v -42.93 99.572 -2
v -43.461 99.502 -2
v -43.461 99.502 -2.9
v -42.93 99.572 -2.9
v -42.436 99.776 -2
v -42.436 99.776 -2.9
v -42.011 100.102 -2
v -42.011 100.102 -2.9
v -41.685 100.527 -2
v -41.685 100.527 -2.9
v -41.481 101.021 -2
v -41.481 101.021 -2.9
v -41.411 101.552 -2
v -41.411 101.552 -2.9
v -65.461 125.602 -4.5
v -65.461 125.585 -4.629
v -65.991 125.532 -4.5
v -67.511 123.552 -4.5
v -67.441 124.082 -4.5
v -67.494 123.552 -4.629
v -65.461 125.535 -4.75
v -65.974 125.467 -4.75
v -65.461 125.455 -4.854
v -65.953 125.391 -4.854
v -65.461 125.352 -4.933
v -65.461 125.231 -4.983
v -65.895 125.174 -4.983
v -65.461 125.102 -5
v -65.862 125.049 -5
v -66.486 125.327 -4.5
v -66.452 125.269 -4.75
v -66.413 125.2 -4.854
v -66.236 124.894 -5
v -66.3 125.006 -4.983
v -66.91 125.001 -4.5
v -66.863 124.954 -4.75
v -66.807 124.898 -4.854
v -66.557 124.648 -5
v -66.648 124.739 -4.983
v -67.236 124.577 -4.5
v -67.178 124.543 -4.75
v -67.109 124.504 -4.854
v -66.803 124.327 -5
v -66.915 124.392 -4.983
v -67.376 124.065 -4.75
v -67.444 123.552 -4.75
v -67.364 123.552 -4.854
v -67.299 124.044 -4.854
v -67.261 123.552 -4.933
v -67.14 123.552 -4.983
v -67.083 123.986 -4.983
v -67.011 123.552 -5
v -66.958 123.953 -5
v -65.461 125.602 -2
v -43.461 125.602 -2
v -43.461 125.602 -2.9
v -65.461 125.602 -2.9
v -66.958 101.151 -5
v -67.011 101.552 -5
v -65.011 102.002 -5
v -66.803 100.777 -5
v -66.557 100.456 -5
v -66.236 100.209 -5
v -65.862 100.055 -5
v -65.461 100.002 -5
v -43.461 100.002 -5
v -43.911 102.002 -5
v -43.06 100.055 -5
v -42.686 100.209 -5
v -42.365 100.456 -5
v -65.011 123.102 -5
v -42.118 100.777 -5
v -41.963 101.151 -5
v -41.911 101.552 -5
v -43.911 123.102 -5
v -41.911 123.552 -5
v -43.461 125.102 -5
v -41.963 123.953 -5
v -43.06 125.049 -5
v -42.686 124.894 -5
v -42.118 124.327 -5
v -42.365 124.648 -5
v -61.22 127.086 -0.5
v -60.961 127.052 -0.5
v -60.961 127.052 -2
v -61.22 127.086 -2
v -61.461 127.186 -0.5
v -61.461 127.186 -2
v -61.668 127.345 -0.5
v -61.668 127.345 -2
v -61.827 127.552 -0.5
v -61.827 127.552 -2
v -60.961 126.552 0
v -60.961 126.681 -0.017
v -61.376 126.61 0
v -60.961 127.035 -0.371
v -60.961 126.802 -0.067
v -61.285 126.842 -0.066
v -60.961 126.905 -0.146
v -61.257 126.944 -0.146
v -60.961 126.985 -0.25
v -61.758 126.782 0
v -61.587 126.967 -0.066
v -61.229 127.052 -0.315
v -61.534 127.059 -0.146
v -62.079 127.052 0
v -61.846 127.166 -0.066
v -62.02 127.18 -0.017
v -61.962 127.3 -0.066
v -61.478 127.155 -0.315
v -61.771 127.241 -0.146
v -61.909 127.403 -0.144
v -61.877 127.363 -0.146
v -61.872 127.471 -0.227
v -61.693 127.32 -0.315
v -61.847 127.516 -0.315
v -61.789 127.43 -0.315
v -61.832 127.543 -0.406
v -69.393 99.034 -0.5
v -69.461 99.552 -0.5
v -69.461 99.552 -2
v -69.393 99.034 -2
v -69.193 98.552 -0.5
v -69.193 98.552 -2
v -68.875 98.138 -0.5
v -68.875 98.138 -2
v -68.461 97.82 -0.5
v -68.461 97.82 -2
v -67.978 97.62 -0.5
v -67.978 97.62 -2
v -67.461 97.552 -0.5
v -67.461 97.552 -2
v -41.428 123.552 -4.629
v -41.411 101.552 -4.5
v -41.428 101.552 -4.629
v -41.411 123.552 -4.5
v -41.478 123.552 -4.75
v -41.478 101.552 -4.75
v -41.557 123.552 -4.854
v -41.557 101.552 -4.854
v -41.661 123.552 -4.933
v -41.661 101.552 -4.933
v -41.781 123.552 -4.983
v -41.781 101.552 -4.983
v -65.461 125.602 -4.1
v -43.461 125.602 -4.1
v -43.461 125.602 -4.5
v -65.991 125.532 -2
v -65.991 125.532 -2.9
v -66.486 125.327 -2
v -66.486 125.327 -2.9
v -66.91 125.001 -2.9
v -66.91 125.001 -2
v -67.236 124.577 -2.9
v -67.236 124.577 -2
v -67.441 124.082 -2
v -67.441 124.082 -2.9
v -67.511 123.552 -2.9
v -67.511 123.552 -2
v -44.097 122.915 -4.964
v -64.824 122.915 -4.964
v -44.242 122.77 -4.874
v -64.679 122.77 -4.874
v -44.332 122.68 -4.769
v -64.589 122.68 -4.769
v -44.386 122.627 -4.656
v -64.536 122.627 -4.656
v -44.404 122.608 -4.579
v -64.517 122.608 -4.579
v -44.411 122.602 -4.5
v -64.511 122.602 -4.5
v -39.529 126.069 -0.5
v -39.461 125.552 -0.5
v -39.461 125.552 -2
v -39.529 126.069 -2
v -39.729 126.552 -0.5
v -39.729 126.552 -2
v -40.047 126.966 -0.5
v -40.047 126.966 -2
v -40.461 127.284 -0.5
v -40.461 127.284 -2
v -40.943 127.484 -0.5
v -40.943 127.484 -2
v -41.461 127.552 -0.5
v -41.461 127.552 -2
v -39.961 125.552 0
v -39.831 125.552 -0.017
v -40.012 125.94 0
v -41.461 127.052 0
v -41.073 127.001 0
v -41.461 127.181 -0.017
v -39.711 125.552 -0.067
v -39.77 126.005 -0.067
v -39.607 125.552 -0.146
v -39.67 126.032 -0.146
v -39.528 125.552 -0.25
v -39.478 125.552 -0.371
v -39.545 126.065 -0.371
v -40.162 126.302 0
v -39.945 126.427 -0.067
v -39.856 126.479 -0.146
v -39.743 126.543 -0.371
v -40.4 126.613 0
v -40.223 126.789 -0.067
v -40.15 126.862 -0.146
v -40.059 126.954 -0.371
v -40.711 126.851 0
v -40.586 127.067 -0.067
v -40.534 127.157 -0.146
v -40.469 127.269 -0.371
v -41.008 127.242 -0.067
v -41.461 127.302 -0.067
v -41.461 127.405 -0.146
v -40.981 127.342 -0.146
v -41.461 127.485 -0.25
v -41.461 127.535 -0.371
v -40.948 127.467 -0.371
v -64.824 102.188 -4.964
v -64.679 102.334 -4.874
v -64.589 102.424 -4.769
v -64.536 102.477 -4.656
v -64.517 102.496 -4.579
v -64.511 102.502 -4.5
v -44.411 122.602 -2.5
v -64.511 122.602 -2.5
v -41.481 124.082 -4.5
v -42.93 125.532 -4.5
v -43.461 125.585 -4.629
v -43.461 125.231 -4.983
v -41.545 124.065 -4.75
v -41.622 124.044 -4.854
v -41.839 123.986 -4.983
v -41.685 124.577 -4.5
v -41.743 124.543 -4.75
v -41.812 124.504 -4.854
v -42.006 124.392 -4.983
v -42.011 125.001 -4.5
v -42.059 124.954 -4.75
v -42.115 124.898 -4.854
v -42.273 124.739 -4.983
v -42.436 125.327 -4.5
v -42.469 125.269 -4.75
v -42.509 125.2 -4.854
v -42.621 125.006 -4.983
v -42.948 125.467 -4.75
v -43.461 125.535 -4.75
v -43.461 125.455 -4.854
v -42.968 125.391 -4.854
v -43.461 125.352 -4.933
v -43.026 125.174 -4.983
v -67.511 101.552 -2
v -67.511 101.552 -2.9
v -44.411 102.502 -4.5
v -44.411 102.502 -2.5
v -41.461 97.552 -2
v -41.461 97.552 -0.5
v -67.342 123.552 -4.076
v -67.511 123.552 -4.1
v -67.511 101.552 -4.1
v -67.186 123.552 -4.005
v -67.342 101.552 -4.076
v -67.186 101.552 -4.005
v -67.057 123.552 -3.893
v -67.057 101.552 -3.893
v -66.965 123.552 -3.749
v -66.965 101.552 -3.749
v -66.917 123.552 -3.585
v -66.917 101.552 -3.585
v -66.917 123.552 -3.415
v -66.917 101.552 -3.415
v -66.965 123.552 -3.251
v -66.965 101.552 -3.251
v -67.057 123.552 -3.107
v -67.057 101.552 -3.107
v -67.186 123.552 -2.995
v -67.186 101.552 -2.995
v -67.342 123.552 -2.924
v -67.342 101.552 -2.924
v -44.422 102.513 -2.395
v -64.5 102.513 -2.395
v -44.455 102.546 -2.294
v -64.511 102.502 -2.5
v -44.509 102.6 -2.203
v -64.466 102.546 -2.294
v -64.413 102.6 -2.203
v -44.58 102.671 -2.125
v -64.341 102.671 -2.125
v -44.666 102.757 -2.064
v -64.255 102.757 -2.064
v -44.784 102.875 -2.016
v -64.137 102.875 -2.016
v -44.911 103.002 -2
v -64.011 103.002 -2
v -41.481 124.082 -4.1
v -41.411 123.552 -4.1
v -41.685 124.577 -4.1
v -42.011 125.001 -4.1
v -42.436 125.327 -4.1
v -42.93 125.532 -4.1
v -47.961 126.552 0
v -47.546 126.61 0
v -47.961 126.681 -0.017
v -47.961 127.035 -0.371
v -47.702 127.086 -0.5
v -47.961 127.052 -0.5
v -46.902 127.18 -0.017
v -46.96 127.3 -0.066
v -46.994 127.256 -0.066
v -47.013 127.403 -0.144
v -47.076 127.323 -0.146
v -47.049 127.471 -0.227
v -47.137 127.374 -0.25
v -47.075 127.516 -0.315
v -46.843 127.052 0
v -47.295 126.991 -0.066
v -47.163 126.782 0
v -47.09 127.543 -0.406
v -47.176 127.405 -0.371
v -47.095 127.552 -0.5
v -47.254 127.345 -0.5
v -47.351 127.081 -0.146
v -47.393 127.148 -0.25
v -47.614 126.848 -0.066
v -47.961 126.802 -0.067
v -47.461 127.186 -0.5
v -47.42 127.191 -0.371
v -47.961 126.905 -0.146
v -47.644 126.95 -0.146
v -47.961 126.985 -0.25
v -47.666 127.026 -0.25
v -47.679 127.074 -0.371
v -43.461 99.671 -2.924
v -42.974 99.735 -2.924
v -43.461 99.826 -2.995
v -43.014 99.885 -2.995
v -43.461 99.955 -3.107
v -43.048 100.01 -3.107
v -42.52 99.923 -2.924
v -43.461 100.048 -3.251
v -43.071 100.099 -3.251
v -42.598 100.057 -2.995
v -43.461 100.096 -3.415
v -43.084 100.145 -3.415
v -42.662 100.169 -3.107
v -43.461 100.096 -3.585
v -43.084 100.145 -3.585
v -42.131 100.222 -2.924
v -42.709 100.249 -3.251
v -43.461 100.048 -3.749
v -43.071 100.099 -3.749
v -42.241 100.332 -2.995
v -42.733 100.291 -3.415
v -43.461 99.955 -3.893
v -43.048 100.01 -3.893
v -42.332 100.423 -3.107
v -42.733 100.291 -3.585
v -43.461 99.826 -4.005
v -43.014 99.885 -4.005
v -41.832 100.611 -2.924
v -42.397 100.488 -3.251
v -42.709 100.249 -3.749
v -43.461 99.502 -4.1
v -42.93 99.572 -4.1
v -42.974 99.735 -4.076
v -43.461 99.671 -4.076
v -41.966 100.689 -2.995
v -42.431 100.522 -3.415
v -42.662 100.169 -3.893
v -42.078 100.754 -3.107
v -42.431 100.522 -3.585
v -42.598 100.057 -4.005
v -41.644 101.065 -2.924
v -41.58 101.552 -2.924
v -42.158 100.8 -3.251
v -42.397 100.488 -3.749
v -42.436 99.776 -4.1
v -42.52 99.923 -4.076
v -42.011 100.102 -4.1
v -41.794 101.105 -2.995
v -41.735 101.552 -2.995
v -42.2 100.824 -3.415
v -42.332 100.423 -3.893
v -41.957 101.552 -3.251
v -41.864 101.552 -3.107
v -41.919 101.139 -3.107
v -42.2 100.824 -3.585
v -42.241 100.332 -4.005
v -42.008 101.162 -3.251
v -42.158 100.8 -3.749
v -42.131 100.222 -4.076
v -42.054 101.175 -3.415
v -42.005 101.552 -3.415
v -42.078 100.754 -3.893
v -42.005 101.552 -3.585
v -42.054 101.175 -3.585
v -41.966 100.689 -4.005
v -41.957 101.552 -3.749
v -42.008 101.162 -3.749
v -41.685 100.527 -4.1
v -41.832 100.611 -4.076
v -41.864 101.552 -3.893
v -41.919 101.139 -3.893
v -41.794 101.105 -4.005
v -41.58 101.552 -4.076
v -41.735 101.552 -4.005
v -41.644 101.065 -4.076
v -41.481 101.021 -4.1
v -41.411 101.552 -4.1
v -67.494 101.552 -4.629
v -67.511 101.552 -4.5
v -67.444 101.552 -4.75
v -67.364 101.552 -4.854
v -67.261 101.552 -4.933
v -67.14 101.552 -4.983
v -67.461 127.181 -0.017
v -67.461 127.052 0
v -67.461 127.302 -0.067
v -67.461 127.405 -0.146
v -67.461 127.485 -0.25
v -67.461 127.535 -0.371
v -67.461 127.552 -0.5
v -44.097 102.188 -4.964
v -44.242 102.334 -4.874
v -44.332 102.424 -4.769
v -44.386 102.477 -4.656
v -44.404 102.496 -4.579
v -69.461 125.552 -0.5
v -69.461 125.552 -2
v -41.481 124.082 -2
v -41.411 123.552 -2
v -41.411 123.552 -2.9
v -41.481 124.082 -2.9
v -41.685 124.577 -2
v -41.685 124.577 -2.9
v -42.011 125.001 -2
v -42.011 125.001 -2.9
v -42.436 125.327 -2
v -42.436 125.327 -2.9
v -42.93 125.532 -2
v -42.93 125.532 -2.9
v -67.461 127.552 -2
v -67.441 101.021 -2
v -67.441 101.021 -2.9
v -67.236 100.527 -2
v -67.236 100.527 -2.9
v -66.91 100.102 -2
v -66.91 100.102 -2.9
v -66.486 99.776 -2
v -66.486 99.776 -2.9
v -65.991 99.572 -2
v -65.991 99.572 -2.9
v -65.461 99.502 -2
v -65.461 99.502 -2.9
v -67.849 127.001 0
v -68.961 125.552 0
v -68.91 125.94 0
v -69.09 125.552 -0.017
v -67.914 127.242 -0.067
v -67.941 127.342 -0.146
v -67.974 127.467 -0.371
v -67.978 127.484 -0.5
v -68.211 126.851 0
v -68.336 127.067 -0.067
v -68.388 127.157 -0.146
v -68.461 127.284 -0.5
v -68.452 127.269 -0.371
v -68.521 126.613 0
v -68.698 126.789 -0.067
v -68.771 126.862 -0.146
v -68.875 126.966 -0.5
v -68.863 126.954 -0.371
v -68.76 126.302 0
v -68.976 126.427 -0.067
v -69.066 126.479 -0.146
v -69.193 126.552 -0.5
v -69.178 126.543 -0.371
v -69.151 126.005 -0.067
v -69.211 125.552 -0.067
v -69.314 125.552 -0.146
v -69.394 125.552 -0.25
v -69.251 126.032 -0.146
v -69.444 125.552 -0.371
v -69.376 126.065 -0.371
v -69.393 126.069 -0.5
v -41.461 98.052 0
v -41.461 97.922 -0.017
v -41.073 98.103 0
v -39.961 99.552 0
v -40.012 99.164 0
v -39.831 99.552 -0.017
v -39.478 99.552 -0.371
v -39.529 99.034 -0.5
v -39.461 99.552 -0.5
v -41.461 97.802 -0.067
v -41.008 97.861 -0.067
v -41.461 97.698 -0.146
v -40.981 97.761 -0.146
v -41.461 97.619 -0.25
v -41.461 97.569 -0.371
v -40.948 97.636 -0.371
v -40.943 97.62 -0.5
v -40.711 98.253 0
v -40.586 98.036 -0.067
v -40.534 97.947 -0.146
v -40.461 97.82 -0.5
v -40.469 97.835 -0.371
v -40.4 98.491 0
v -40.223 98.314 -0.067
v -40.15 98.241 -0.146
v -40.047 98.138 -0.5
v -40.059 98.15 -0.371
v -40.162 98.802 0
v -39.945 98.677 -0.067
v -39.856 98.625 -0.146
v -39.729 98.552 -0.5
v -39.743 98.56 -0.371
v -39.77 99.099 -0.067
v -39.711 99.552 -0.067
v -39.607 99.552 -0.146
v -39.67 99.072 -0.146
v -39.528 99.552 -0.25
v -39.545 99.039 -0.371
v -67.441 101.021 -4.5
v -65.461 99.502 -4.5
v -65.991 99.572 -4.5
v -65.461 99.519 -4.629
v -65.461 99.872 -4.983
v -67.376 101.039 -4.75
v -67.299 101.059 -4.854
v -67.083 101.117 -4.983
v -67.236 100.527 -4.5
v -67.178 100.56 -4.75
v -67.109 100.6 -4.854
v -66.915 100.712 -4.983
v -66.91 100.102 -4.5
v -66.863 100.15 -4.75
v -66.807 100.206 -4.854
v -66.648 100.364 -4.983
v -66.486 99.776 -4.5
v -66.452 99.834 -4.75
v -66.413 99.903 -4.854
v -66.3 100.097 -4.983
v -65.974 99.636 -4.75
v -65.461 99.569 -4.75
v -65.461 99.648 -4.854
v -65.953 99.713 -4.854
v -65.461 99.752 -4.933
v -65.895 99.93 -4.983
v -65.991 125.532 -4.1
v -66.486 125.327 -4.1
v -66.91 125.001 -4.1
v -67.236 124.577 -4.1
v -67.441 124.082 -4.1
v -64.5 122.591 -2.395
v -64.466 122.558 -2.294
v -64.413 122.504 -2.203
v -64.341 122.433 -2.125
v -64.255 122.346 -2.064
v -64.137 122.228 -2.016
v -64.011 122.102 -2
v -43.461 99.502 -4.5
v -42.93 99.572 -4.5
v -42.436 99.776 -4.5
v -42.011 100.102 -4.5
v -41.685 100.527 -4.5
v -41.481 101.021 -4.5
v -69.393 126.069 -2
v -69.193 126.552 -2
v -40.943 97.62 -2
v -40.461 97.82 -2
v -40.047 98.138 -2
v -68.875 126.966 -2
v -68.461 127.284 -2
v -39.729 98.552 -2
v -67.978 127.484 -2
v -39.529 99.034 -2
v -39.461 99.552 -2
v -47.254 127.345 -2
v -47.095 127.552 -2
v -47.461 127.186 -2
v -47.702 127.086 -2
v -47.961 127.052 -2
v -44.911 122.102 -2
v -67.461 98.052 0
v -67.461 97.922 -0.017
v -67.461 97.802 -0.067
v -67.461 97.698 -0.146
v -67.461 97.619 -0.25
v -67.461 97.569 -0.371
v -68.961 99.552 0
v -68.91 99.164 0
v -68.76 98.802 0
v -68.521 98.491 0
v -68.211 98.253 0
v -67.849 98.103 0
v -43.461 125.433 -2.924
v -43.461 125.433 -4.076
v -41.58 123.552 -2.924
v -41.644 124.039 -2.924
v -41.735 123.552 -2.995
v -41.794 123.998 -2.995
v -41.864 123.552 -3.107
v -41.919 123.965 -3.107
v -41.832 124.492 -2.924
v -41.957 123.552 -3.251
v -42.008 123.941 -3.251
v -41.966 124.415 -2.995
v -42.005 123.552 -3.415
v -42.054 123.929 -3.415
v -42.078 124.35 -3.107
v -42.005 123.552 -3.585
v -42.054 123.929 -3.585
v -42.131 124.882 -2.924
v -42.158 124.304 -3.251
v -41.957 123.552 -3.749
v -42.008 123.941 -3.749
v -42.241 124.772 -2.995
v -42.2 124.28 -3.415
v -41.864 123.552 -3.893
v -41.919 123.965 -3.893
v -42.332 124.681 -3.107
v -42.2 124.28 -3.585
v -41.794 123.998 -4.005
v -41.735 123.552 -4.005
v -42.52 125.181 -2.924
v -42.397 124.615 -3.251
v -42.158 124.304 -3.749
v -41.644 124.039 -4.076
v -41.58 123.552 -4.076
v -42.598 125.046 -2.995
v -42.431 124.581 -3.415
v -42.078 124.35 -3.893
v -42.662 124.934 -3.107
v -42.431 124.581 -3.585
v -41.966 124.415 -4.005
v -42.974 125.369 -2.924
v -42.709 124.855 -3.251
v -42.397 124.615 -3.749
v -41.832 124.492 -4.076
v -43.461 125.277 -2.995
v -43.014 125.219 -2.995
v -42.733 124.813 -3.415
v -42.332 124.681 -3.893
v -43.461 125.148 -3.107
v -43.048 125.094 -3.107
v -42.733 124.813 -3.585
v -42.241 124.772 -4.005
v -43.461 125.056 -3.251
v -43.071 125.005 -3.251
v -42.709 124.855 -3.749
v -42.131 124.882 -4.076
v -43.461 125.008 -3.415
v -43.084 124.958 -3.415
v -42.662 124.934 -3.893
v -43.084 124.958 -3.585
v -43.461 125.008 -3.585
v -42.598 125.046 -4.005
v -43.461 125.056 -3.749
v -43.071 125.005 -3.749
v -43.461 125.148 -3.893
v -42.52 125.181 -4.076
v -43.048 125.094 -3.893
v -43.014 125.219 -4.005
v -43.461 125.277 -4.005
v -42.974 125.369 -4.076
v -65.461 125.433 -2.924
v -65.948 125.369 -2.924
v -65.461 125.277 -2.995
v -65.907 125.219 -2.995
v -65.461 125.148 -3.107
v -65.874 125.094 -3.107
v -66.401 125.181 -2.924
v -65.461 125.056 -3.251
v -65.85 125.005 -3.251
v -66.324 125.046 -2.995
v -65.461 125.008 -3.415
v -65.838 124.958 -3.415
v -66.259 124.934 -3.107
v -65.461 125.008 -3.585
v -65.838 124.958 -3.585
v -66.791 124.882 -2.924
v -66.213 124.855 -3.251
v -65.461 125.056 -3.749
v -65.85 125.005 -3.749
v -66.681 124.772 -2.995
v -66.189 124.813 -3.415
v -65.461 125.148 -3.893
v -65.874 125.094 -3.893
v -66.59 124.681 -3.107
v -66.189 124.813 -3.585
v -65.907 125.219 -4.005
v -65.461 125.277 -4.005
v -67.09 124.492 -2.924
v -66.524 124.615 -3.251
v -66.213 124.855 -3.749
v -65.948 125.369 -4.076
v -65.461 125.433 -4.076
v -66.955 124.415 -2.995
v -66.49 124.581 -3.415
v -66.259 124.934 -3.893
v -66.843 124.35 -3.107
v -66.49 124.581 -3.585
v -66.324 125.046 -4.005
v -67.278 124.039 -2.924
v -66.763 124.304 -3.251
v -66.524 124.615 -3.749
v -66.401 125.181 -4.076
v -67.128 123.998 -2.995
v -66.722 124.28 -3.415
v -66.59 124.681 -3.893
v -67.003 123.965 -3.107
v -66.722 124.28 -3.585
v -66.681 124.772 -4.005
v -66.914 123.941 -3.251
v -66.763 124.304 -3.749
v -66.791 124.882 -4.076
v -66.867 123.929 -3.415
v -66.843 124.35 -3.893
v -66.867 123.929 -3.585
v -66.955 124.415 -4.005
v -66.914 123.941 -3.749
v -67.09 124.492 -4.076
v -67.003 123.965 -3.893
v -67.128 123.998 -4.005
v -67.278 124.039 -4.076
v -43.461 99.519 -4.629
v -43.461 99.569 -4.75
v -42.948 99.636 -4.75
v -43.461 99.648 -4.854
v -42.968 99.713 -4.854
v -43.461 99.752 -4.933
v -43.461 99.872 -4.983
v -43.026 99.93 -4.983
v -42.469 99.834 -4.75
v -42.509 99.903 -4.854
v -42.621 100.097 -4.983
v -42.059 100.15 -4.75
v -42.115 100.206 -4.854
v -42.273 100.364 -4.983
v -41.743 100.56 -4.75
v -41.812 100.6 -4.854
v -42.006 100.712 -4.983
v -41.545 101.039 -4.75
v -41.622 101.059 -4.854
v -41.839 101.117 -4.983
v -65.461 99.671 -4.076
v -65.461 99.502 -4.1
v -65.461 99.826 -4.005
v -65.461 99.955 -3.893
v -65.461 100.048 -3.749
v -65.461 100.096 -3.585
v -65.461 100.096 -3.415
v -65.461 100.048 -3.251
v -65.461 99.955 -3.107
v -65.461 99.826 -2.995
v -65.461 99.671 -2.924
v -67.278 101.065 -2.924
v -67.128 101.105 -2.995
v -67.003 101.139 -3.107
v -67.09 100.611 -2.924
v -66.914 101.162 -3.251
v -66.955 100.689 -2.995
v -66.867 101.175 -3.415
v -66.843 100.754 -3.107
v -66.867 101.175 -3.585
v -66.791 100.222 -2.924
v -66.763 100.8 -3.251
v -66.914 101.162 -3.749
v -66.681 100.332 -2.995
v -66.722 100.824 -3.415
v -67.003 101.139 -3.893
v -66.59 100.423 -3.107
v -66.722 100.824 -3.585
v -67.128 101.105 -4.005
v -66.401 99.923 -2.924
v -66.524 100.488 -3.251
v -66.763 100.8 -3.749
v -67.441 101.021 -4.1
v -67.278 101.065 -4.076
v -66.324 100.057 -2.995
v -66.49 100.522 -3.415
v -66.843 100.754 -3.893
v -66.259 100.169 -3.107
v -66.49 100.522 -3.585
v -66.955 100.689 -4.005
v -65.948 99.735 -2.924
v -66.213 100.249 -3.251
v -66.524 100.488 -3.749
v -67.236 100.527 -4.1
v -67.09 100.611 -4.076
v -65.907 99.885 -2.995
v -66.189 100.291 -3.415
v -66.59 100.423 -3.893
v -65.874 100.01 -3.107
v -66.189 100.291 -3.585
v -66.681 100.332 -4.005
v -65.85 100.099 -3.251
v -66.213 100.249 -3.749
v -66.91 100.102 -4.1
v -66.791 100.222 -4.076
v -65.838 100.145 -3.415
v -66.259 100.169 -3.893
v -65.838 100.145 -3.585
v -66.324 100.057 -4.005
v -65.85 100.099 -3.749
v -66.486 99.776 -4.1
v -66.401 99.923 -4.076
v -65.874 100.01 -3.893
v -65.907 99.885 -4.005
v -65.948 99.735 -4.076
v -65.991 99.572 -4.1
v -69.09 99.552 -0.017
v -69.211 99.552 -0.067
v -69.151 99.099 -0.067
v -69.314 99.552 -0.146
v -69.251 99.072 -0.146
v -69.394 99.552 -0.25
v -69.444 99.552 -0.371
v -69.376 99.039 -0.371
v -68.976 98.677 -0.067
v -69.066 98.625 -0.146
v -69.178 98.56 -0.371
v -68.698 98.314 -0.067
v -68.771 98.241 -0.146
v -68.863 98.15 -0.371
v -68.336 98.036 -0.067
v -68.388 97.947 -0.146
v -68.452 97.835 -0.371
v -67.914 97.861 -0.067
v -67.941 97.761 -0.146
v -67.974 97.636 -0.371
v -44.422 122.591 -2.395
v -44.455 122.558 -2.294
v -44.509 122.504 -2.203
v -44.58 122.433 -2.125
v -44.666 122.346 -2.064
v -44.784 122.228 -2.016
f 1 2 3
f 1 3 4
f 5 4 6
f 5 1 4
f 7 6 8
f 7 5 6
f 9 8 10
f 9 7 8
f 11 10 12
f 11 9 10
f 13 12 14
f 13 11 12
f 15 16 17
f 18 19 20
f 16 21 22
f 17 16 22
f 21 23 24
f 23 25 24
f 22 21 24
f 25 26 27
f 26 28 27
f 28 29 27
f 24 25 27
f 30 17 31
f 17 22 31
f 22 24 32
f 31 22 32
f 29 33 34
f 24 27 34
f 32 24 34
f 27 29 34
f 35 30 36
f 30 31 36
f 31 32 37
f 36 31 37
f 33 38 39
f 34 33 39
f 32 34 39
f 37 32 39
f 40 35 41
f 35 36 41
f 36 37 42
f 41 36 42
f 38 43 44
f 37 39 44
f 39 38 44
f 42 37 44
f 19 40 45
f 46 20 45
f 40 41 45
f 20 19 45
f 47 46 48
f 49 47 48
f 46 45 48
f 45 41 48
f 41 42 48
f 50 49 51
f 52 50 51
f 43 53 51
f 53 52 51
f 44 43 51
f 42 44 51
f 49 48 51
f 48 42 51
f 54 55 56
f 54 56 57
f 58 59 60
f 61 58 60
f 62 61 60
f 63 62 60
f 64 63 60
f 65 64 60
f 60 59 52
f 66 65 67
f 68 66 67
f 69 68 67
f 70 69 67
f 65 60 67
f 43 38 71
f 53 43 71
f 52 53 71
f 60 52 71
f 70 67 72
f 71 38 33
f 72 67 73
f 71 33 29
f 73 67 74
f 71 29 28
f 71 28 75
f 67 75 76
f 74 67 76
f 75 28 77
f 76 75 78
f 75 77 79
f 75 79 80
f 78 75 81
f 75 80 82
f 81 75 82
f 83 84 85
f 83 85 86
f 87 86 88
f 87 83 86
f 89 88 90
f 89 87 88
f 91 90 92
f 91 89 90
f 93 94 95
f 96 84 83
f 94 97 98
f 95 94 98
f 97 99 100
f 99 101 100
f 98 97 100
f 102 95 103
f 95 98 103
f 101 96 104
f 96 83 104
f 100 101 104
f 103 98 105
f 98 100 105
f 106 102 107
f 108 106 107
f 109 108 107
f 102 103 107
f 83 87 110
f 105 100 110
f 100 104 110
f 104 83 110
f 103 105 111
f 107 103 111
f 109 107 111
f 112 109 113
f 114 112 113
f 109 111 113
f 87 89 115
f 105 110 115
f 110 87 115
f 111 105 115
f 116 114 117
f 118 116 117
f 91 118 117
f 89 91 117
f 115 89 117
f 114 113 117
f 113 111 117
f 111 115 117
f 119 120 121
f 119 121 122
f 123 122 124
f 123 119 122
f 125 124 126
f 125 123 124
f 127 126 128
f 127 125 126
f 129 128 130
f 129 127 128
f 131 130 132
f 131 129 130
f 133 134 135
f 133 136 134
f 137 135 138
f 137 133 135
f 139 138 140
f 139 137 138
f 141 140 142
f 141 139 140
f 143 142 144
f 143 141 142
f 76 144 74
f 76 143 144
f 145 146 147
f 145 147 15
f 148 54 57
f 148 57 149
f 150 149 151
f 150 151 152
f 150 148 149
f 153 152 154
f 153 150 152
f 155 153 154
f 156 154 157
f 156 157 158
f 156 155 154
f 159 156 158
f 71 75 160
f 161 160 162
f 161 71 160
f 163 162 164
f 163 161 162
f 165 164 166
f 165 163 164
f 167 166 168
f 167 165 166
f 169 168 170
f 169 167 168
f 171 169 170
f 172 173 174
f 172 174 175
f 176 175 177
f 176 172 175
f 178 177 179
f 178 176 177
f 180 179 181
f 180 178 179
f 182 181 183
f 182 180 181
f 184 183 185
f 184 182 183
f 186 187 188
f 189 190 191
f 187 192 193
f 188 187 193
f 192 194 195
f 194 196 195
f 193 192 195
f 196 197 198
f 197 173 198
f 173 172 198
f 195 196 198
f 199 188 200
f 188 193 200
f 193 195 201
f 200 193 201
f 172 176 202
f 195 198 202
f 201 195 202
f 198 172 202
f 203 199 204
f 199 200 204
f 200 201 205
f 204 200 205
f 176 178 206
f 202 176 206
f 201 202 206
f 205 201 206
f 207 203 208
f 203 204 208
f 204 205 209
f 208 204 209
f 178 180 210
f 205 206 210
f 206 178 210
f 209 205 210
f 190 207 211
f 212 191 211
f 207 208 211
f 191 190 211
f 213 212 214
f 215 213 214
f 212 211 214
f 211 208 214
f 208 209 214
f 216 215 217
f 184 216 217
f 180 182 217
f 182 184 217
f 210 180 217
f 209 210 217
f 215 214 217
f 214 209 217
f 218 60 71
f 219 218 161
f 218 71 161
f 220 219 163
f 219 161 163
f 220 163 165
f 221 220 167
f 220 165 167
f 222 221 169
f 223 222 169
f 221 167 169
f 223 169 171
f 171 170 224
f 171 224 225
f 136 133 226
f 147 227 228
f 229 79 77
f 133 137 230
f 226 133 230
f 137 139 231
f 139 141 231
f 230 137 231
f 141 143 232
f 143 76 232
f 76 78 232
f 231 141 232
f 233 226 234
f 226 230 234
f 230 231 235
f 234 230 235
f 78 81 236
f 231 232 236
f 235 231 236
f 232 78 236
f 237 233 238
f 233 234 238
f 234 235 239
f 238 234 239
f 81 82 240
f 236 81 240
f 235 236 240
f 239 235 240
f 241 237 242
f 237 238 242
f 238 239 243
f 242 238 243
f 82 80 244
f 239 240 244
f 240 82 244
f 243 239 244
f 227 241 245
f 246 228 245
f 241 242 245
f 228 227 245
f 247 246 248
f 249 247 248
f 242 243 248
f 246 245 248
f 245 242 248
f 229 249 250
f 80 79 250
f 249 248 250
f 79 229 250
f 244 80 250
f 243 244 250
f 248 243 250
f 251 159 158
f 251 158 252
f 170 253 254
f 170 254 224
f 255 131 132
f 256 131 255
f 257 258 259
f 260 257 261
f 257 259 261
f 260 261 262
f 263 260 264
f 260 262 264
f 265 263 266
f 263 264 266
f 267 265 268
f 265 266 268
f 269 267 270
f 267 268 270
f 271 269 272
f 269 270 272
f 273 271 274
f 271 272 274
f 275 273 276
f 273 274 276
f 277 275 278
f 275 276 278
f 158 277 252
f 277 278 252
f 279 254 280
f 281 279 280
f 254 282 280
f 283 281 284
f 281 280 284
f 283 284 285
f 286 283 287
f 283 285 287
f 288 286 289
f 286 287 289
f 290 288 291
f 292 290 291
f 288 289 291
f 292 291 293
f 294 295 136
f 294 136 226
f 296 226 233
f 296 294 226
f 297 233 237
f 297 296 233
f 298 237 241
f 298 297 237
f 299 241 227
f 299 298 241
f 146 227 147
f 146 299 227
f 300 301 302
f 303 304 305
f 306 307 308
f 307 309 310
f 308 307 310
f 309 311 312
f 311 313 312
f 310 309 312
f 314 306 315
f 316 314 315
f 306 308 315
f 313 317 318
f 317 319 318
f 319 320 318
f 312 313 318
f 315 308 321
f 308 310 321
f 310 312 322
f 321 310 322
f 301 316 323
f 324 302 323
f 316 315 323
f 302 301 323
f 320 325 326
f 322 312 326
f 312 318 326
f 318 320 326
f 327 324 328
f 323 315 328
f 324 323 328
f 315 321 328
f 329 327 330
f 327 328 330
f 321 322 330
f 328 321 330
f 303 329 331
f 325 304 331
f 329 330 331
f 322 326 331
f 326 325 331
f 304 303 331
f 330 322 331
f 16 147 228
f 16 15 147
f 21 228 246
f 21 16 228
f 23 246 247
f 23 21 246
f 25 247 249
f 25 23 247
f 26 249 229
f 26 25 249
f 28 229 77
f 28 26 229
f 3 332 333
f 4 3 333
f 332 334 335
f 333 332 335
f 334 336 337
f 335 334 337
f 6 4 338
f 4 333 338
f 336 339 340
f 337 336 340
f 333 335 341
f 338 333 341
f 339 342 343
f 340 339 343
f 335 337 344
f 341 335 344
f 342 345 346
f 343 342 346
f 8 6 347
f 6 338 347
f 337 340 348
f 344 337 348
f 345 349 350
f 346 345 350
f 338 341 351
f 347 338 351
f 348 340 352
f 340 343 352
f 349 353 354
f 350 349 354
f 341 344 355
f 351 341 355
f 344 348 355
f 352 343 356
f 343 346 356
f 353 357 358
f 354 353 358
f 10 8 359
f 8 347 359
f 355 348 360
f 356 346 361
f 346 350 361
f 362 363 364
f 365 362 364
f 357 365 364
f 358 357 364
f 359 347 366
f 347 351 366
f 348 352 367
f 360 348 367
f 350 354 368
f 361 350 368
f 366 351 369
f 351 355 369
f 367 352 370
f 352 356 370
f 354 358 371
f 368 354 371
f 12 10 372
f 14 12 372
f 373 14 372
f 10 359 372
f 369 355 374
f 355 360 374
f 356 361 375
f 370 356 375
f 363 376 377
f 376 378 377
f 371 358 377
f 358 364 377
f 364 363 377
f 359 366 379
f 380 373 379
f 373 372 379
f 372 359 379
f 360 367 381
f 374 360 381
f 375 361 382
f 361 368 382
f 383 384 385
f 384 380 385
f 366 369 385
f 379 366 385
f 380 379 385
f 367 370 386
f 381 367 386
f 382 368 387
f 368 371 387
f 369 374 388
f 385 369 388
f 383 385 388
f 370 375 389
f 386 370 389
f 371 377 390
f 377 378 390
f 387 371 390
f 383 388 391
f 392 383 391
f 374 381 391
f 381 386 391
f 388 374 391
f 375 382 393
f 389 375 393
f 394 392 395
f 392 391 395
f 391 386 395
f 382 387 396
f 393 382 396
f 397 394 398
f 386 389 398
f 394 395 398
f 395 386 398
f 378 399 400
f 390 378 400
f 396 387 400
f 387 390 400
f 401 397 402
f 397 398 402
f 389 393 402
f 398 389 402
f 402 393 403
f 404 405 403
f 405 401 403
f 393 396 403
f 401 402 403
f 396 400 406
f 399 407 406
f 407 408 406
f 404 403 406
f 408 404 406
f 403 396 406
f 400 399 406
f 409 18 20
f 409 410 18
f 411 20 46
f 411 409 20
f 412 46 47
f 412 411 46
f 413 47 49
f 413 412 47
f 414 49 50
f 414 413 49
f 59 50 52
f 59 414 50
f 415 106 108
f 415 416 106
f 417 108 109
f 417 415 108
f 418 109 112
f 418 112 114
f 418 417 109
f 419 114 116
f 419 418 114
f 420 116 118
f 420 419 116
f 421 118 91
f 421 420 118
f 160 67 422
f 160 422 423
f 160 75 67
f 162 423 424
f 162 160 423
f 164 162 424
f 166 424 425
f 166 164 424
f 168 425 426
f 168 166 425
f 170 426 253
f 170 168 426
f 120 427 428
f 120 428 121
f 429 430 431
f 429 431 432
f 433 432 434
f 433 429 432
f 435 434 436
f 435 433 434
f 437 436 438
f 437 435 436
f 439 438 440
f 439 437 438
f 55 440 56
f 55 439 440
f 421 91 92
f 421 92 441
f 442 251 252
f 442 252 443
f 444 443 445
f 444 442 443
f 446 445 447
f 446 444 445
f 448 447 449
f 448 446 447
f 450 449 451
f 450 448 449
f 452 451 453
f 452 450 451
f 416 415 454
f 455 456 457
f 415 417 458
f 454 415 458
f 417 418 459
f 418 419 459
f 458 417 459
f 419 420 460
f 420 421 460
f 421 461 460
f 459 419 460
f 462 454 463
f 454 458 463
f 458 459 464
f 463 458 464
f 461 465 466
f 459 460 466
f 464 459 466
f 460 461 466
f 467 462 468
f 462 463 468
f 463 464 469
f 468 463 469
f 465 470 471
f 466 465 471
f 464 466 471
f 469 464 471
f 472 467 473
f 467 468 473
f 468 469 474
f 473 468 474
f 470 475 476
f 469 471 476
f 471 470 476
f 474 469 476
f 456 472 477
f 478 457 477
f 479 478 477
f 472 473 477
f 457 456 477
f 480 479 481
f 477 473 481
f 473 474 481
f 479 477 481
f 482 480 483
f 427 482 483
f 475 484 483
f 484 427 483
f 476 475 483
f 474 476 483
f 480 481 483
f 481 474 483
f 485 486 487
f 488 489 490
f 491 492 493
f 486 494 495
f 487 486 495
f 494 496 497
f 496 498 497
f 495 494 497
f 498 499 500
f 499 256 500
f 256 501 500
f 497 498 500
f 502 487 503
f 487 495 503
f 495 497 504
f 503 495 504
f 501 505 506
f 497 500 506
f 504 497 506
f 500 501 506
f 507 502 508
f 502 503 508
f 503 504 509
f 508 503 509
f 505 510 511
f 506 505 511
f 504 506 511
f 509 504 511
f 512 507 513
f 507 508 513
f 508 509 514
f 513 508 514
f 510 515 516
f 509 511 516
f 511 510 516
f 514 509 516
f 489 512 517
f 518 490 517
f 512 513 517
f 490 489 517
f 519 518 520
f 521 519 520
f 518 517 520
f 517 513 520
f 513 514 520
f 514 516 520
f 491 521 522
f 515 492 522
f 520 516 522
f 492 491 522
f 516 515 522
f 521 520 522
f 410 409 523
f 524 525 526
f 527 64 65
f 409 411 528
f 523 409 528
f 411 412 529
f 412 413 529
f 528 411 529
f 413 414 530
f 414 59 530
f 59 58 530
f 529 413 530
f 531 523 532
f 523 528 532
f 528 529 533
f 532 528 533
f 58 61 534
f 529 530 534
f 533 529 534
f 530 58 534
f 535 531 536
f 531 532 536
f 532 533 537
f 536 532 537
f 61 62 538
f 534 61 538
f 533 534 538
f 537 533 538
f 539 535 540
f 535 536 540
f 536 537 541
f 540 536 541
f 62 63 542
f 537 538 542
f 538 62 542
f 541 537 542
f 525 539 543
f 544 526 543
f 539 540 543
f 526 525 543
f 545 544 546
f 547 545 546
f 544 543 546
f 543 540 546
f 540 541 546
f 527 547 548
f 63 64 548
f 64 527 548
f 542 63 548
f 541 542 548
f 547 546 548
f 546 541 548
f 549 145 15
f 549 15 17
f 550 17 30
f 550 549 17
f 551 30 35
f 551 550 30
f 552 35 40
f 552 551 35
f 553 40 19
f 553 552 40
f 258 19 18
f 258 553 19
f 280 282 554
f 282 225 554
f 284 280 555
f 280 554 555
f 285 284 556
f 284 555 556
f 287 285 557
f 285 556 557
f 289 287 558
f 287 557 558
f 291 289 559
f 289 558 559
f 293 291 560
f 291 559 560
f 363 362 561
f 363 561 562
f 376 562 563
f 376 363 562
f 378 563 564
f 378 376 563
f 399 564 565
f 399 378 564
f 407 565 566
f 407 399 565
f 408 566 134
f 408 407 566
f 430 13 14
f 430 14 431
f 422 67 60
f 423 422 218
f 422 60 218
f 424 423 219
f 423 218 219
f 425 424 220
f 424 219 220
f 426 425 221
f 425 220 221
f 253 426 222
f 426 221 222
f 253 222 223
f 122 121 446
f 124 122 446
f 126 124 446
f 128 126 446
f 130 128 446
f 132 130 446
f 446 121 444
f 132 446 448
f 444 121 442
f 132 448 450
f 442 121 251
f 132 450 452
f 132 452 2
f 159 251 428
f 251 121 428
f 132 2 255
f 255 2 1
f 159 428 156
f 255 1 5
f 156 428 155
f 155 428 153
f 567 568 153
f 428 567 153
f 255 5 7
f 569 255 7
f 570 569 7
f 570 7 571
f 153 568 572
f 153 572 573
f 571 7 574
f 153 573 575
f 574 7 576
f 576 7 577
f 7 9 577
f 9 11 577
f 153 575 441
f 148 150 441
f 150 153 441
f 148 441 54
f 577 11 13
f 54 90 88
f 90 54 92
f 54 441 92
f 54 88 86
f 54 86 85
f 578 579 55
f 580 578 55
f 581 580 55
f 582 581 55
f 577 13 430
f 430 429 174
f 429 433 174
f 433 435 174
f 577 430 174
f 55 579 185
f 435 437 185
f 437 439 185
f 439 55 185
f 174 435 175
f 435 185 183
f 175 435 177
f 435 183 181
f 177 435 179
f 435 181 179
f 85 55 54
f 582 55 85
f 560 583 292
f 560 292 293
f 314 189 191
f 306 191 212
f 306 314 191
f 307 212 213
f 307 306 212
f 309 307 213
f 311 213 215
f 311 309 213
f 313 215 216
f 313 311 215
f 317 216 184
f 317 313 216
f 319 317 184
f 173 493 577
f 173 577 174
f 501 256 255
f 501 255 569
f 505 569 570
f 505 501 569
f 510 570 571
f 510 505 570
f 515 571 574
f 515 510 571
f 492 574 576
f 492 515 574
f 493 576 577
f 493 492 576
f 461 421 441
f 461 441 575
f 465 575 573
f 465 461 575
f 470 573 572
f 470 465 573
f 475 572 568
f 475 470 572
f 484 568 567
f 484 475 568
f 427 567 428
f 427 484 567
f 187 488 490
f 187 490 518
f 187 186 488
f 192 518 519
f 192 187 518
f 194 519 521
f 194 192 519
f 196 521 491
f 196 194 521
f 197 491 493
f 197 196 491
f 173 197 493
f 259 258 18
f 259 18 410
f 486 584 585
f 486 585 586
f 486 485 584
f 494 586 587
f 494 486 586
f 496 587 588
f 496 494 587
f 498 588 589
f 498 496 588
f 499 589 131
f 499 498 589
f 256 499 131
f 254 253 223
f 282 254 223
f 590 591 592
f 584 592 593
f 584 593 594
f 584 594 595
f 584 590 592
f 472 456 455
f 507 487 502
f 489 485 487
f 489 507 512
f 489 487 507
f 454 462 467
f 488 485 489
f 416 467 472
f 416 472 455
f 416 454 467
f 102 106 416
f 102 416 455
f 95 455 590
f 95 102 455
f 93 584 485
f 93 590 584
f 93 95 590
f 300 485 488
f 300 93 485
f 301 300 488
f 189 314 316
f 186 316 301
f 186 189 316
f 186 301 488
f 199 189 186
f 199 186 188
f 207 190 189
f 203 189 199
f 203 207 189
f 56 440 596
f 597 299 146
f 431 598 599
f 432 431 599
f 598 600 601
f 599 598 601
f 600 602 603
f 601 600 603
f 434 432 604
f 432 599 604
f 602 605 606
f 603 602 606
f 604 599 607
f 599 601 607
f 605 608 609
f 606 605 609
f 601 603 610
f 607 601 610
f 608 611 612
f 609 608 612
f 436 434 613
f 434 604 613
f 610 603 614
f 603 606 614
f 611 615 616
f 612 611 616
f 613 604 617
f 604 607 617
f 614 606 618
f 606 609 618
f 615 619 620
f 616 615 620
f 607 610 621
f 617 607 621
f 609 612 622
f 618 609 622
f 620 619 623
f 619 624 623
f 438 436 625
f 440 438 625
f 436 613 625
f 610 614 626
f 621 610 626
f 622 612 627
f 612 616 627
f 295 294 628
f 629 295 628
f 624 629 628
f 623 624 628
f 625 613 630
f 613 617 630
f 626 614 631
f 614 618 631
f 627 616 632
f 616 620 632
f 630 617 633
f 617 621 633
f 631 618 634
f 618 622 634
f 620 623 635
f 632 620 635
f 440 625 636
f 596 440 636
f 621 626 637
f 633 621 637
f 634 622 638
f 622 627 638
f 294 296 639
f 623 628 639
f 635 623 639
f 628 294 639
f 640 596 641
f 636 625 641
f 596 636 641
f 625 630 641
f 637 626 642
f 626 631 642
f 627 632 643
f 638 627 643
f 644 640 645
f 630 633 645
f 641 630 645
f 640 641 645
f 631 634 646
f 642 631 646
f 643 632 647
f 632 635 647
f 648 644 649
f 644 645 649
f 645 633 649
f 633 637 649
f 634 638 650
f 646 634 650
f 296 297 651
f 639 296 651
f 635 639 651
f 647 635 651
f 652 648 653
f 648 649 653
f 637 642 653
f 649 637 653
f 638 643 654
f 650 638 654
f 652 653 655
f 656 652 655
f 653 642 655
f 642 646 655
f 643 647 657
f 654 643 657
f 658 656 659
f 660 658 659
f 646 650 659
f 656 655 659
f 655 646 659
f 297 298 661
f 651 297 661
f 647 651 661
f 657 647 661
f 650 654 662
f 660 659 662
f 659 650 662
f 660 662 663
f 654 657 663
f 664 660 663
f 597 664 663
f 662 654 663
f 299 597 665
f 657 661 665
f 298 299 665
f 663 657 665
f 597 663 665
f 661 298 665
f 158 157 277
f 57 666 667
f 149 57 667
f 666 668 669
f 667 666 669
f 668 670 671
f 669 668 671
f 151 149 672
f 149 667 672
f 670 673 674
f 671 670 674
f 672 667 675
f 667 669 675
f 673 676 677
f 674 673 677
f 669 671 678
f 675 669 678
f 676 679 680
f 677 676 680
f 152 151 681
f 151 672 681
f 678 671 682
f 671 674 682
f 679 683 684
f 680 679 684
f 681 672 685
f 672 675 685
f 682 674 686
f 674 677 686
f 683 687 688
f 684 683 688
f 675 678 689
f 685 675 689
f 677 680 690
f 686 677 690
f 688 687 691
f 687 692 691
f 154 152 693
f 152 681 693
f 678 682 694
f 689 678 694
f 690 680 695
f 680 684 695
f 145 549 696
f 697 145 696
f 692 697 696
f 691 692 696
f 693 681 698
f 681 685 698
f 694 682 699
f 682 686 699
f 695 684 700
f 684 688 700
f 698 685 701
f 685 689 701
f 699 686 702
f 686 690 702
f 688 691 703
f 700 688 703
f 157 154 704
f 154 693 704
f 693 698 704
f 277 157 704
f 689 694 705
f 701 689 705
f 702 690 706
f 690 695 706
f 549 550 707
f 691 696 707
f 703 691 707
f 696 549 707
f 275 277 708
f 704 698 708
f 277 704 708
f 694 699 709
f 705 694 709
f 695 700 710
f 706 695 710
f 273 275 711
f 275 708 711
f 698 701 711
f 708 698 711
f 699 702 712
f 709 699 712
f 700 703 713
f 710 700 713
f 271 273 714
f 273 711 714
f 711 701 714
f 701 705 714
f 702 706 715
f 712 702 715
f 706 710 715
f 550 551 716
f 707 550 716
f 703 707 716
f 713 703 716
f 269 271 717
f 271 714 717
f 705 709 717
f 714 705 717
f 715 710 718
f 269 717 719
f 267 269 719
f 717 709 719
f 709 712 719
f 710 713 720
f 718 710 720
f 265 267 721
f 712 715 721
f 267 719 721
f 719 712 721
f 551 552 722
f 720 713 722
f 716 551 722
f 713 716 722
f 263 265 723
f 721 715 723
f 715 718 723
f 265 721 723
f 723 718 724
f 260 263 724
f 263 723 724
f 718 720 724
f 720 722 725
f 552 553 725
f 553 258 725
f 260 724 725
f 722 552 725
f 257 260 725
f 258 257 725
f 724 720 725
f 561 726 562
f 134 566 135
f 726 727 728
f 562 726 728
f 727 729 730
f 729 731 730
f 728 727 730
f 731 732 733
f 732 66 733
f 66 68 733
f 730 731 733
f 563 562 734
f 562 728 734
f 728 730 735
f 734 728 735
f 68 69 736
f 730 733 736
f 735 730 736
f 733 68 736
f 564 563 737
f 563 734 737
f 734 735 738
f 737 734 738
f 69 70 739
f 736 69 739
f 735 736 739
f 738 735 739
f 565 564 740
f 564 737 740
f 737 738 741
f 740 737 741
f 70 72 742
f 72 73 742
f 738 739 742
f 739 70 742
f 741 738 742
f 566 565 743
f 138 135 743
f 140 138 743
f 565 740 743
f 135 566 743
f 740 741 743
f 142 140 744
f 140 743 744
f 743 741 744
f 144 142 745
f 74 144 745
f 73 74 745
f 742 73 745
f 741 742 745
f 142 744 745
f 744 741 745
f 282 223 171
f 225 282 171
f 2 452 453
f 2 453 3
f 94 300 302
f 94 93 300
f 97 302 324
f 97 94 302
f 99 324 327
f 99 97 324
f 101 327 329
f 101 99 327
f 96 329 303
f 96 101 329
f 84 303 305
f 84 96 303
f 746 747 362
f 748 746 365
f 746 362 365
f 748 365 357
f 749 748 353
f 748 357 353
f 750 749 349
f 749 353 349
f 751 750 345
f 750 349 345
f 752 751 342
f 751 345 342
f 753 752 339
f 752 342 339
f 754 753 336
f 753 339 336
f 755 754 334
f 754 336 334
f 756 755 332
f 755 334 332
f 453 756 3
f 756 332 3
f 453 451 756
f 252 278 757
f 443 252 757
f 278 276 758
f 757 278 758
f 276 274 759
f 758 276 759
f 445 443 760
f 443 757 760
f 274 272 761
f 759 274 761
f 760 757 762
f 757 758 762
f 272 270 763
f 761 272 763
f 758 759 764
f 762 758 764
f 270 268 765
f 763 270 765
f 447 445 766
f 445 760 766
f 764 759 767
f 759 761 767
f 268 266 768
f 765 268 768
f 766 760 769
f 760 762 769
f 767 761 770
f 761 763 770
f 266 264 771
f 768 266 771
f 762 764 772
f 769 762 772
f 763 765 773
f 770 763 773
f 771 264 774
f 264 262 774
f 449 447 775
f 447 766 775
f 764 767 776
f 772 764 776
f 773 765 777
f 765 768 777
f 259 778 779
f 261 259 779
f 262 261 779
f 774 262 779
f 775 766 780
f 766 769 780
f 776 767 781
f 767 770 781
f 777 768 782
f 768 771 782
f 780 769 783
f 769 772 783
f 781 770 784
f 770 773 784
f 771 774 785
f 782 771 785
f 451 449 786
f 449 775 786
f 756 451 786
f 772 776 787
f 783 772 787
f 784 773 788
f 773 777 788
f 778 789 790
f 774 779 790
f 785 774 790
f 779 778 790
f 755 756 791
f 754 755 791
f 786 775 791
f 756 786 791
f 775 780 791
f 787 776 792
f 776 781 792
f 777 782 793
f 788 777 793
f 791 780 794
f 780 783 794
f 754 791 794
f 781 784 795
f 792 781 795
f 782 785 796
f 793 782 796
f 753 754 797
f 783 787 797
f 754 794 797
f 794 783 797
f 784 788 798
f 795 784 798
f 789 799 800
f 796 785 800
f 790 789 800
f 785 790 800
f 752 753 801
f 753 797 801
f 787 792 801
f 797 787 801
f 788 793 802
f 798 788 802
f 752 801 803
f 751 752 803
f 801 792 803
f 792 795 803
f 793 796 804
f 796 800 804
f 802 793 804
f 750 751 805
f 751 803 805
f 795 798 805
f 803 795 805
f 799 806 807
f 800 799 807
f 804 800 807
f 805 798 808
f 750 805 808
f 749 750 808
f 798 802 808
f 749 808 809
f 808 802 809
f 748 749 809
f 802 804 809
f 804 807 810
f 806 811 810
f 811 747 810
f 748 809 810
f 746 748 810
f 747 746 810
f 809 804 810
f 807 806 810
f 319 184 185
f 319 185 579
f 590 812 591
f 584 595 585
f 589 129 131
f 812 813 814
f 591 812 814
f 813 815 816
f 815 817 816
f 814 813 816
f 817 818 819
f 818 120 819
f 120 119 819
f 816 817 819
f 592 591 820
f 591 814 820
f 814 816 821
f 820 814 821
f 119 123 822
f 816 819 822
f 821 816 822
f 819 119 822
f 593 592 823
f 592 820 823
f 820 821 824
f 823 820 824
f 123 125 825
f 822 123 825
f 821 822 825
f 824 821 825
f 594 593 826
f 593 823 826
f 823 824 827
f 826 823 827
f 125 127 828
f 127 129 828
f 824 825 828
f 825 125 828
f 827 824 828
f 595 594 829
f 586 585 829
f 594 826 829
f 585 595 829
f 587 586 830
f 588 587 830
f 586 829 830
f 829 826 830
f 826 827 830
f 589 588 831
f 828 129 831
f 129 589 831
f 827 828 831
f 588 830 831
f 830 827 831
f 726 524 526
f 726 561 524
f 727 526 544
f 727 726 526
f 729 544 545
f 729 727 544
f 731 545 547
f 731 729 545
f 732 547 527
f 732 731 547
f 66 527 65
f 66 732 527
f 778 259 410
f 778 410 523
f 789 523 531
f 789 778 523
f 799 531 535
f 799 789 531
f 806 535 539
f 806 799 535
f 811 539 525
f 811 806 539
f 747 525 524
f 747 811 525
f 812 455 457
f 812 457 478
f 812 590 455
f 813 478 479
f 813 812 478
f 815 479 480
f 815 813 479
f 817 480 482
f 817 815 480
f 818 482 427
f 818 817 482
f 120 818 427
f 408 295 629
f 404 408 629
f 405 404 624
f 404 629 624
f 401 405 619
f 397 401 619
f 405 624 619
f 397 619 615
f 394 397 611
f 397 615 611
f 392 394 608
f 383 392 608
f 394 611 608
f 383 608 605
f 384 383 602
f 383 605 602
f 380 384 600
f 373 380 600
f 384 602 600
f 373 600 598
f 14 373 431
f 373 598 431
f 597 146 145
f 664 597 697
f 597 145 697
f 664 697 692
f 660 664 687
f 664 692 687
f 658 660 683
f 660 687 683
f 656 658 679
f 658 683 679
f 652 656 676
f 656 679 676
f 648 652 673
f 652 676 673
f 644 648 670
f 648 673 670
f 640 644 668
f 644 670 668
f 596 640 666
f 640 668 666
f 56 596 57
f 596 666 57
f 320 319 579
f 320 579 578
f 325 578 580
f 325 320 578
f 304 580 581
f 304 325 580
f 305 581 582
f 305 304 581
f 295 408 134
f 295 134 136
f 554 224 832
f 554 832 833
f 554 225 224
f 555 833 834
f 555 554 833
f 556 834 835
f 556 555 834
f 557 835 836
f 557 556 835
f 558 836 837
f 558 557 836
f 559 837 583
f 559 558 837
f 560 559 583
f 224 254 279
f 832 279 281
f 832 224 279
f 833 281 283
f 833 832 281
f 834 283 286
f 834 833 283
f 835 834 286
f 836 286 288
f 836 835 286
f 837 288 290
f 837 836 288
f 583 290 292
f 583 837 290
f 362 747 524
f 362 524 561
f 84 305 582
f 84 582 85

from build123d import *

# Parameters (mm, degrees)
BOSS_EXTRUDE1_DEPTH = 2
BOSS_EXTRUDE2_DEPTH = 5
SKETCH6_W           = 20.1
SKETCH6_H           = 20.1
CUT_EXTRUDE1_DEPTH  = 3
SKETCH5_R           = 0.6
FILLET1_R           = 0.5


with BuildPart() as part:
    # Sketch2 → Boss-Extrude1 (new body)
    with BuildSketch(Plane.XY):
        with BuildLine():
            ThreePointArc((-60.960758129, 127.051811933), (-61.460758129, 127.185786529), (-61.826783532, 127.551811933))
            Line((-61.826783532, 127.551811933), (-67.460758129, 127.551811933))
            ThreePointArc((-67.460758129, 127.551811933), (-68.874971691, 126.966025495), (-69.460758129, 125.551811933))
            Line((-69.460758129, 125.551811933), (-69.460758129, 99.551811933))
            ThreePointArc((-69.460758129, 99.551811933), (-68.874971691, 98.13759837), (-67.460758129, 97.551811933))
            Line((-67.460758129, 97.551811933), (-41.460758129, 97.551811933))
            ThreePointArc((-41.460758129, 97.551811933), (-40.046544566, 98.13759837), (-39.460758129, 99.551811933))
            Line((-39.460758129, 99.551811933), (-39.460758129, 125.551811933))
            ThreePointArc((-39.460758129, 125.551811933), (-40.046544566, 126.966025495), (-41.460758129, 127.551811933))
            Line((-41.460758129, 127.551811933), (-47.094732725, 127.551811933))
            ThreePointArc((-47.094732725, 127.551811933), (-47.460758129, 127.185786529), (-47.960758129, 127.051811933))
            Line((-47.960758129, 127.051811933), (-60.960758129, 127.051811933))
        make_face()
    extrude(amount=-BOSS_EXTRUDE1_DEPTH)

    # Sketch2<2> → Boss-Extrude2 (add)
    with BuildSketch(Plane.XY):
        with BuildLine():
            Line((-65.460758129, 99.501811933), (-43.460758129, 99.501811933))
            ThreePointArc((-43.460758129, 99.501811933), (-42.011189227, 100.102243031), (-41.410758129, 101.551811933))
            Line((-41.410758129, 101.551811933), (-41.410758129, 123.551811933))
            ThreePointArc((-41.410758129, 123.551811933), (-42.011189227, 125.001380834), (-43.460758129, 125.601811933))
            Line((-43.460758129, 125.601811933), (-65.460758129, 125.601811933))
            ThreePointArc((-65.460758129, 125.601811933), (-66.91032703, 125.001380834), (-67.510758129, 123.551811933))
            Line((-67.510758129, 123.551811933), (-67.510758129, 101.551811933))
            ThreePointArc((-67.510758129, 101.551811933), (-66.91032703, 100.102243031), (-65.460758129, 99.501811933))
        make_face()
    extrude(amount=-BOSS_EXTRUDE2_DEPTH)

    # Sketch6 → Cut-Extrude1 (cut)
    with BuildSketch(Plane(origin=(0, 0, -5), x_dir=(-1, 0, 0), z_dir=(0, 0, -1))):
        with Locations((54.460758129, 112.551811933)):
            Rectangle(SKETCH6_W, SKETCH6_H)
    extrude(amount=-CUT_EXTRUDE1_DEPTH, mode=Mode.SUBTRACT)

    # Cut-Sweep1: sweep along a path in Sketch4
    with BuildLine(Plane.XY.offset(-3.5)) as cut_sweep1_path:
        Line((-41.410758129, 101.551811933), (-41.410758129, 123.551811933))
        ThreePointArc((-41.410758129, 123.551811933), (-42.011189227, 125.001380834), (-43.460758129, 125.601811933))
        Line((-43.460758129, 125.601811933), (-65.460758129, 125.601811933))
        ThreePointArc((-65.460758129, 125.601811933), (-66.91032703, 125.001380834), (-67.510758129, 123.551811933))
        Line((-67.510758129, 123.551811933), (-67.510758129, 101.551811933))
        ThreePointArc((-67.510758129, 101.551811933), (-66.91032703, 100.102243031), (-65.460758129, 99.501811933))
        Line((-65.460758129, 99.501811933), (-43.460758129, 99.501811933))
        ThreePointArc((-43.460758129, 99.501811933), (-42.011189227, 100.102243031), (-41.410758129, 101.551811933))
    # Sketch5 → Cut-Sweep1 (sweep, cut)
    with BuildSketch(Plane(origin=(-54.460758129, 0, 0), x_dir=(0, 0, -1), z_dir=(1, 0, 0))):
        with Locations((3.5, 125.601811933)):
            Circle(SKETCH5_R)
    sweep(path=cut_sweep1_path.line, mode=Mode.SUBTRACT)

    # Fillet1
    fillet1_edges = [part.edges().sort_by_distance(p)[0] for p in [
        (-44.277745427, 127.551811933, 0),
        (-40.046544566, 126.966025495, 0),
        (-39.460758129, 112.551811933, 0),
        (-40.046544566, 98.13759837, 0),
        (-54.460758129, 97.551811933, 0),
        (-68.874971691, 98.13759837, 0),
        (-69.460758129, 112.551811933, 0),
        (-68.874971691, 126.966025495, 0),
        (-64.64377083, 127.551811933, 0),
        (-61.460758129, 127.185786529, 0),
        (-54.460758129, 127.051811933, 0),
        (-47.460758129, 127.185786529, 0),
        (-64.510758129, 112.551811933, -2),
        (-54.460758129, 102.501811933, -2),
        (-44.410758129, 112.551811933, -2),
        (-54.460758129, 122.601811933, -2),
        (-42.011189227, 125.001380834, -5),
        (-54.460758129, 125.601811933, -5),
        (-66.91032703, 125.001380834, -5),
        (-67.510758129, 112.551811933, -5),
        (-66.91032703, 100.102243031, -5),
        (-54.460758129, 99.501811933, -5),
        (-42.011189227, 100.102243031, -5),
        (-41.410758129, 112.551811933, -5),
        (-64.510758129, 112.551811933, -5),
        (-54.460758129, 122.601811933, -5),
        (-44.410758129, 112.551811933, -5),
        (-54.460758129, 102.501811933, -5),
    ]]
    fillet(fillet1_edges, radius=FILLET1_R - 0.0001)  # a hair under: the kernel refuses the full size


solid = part.part
